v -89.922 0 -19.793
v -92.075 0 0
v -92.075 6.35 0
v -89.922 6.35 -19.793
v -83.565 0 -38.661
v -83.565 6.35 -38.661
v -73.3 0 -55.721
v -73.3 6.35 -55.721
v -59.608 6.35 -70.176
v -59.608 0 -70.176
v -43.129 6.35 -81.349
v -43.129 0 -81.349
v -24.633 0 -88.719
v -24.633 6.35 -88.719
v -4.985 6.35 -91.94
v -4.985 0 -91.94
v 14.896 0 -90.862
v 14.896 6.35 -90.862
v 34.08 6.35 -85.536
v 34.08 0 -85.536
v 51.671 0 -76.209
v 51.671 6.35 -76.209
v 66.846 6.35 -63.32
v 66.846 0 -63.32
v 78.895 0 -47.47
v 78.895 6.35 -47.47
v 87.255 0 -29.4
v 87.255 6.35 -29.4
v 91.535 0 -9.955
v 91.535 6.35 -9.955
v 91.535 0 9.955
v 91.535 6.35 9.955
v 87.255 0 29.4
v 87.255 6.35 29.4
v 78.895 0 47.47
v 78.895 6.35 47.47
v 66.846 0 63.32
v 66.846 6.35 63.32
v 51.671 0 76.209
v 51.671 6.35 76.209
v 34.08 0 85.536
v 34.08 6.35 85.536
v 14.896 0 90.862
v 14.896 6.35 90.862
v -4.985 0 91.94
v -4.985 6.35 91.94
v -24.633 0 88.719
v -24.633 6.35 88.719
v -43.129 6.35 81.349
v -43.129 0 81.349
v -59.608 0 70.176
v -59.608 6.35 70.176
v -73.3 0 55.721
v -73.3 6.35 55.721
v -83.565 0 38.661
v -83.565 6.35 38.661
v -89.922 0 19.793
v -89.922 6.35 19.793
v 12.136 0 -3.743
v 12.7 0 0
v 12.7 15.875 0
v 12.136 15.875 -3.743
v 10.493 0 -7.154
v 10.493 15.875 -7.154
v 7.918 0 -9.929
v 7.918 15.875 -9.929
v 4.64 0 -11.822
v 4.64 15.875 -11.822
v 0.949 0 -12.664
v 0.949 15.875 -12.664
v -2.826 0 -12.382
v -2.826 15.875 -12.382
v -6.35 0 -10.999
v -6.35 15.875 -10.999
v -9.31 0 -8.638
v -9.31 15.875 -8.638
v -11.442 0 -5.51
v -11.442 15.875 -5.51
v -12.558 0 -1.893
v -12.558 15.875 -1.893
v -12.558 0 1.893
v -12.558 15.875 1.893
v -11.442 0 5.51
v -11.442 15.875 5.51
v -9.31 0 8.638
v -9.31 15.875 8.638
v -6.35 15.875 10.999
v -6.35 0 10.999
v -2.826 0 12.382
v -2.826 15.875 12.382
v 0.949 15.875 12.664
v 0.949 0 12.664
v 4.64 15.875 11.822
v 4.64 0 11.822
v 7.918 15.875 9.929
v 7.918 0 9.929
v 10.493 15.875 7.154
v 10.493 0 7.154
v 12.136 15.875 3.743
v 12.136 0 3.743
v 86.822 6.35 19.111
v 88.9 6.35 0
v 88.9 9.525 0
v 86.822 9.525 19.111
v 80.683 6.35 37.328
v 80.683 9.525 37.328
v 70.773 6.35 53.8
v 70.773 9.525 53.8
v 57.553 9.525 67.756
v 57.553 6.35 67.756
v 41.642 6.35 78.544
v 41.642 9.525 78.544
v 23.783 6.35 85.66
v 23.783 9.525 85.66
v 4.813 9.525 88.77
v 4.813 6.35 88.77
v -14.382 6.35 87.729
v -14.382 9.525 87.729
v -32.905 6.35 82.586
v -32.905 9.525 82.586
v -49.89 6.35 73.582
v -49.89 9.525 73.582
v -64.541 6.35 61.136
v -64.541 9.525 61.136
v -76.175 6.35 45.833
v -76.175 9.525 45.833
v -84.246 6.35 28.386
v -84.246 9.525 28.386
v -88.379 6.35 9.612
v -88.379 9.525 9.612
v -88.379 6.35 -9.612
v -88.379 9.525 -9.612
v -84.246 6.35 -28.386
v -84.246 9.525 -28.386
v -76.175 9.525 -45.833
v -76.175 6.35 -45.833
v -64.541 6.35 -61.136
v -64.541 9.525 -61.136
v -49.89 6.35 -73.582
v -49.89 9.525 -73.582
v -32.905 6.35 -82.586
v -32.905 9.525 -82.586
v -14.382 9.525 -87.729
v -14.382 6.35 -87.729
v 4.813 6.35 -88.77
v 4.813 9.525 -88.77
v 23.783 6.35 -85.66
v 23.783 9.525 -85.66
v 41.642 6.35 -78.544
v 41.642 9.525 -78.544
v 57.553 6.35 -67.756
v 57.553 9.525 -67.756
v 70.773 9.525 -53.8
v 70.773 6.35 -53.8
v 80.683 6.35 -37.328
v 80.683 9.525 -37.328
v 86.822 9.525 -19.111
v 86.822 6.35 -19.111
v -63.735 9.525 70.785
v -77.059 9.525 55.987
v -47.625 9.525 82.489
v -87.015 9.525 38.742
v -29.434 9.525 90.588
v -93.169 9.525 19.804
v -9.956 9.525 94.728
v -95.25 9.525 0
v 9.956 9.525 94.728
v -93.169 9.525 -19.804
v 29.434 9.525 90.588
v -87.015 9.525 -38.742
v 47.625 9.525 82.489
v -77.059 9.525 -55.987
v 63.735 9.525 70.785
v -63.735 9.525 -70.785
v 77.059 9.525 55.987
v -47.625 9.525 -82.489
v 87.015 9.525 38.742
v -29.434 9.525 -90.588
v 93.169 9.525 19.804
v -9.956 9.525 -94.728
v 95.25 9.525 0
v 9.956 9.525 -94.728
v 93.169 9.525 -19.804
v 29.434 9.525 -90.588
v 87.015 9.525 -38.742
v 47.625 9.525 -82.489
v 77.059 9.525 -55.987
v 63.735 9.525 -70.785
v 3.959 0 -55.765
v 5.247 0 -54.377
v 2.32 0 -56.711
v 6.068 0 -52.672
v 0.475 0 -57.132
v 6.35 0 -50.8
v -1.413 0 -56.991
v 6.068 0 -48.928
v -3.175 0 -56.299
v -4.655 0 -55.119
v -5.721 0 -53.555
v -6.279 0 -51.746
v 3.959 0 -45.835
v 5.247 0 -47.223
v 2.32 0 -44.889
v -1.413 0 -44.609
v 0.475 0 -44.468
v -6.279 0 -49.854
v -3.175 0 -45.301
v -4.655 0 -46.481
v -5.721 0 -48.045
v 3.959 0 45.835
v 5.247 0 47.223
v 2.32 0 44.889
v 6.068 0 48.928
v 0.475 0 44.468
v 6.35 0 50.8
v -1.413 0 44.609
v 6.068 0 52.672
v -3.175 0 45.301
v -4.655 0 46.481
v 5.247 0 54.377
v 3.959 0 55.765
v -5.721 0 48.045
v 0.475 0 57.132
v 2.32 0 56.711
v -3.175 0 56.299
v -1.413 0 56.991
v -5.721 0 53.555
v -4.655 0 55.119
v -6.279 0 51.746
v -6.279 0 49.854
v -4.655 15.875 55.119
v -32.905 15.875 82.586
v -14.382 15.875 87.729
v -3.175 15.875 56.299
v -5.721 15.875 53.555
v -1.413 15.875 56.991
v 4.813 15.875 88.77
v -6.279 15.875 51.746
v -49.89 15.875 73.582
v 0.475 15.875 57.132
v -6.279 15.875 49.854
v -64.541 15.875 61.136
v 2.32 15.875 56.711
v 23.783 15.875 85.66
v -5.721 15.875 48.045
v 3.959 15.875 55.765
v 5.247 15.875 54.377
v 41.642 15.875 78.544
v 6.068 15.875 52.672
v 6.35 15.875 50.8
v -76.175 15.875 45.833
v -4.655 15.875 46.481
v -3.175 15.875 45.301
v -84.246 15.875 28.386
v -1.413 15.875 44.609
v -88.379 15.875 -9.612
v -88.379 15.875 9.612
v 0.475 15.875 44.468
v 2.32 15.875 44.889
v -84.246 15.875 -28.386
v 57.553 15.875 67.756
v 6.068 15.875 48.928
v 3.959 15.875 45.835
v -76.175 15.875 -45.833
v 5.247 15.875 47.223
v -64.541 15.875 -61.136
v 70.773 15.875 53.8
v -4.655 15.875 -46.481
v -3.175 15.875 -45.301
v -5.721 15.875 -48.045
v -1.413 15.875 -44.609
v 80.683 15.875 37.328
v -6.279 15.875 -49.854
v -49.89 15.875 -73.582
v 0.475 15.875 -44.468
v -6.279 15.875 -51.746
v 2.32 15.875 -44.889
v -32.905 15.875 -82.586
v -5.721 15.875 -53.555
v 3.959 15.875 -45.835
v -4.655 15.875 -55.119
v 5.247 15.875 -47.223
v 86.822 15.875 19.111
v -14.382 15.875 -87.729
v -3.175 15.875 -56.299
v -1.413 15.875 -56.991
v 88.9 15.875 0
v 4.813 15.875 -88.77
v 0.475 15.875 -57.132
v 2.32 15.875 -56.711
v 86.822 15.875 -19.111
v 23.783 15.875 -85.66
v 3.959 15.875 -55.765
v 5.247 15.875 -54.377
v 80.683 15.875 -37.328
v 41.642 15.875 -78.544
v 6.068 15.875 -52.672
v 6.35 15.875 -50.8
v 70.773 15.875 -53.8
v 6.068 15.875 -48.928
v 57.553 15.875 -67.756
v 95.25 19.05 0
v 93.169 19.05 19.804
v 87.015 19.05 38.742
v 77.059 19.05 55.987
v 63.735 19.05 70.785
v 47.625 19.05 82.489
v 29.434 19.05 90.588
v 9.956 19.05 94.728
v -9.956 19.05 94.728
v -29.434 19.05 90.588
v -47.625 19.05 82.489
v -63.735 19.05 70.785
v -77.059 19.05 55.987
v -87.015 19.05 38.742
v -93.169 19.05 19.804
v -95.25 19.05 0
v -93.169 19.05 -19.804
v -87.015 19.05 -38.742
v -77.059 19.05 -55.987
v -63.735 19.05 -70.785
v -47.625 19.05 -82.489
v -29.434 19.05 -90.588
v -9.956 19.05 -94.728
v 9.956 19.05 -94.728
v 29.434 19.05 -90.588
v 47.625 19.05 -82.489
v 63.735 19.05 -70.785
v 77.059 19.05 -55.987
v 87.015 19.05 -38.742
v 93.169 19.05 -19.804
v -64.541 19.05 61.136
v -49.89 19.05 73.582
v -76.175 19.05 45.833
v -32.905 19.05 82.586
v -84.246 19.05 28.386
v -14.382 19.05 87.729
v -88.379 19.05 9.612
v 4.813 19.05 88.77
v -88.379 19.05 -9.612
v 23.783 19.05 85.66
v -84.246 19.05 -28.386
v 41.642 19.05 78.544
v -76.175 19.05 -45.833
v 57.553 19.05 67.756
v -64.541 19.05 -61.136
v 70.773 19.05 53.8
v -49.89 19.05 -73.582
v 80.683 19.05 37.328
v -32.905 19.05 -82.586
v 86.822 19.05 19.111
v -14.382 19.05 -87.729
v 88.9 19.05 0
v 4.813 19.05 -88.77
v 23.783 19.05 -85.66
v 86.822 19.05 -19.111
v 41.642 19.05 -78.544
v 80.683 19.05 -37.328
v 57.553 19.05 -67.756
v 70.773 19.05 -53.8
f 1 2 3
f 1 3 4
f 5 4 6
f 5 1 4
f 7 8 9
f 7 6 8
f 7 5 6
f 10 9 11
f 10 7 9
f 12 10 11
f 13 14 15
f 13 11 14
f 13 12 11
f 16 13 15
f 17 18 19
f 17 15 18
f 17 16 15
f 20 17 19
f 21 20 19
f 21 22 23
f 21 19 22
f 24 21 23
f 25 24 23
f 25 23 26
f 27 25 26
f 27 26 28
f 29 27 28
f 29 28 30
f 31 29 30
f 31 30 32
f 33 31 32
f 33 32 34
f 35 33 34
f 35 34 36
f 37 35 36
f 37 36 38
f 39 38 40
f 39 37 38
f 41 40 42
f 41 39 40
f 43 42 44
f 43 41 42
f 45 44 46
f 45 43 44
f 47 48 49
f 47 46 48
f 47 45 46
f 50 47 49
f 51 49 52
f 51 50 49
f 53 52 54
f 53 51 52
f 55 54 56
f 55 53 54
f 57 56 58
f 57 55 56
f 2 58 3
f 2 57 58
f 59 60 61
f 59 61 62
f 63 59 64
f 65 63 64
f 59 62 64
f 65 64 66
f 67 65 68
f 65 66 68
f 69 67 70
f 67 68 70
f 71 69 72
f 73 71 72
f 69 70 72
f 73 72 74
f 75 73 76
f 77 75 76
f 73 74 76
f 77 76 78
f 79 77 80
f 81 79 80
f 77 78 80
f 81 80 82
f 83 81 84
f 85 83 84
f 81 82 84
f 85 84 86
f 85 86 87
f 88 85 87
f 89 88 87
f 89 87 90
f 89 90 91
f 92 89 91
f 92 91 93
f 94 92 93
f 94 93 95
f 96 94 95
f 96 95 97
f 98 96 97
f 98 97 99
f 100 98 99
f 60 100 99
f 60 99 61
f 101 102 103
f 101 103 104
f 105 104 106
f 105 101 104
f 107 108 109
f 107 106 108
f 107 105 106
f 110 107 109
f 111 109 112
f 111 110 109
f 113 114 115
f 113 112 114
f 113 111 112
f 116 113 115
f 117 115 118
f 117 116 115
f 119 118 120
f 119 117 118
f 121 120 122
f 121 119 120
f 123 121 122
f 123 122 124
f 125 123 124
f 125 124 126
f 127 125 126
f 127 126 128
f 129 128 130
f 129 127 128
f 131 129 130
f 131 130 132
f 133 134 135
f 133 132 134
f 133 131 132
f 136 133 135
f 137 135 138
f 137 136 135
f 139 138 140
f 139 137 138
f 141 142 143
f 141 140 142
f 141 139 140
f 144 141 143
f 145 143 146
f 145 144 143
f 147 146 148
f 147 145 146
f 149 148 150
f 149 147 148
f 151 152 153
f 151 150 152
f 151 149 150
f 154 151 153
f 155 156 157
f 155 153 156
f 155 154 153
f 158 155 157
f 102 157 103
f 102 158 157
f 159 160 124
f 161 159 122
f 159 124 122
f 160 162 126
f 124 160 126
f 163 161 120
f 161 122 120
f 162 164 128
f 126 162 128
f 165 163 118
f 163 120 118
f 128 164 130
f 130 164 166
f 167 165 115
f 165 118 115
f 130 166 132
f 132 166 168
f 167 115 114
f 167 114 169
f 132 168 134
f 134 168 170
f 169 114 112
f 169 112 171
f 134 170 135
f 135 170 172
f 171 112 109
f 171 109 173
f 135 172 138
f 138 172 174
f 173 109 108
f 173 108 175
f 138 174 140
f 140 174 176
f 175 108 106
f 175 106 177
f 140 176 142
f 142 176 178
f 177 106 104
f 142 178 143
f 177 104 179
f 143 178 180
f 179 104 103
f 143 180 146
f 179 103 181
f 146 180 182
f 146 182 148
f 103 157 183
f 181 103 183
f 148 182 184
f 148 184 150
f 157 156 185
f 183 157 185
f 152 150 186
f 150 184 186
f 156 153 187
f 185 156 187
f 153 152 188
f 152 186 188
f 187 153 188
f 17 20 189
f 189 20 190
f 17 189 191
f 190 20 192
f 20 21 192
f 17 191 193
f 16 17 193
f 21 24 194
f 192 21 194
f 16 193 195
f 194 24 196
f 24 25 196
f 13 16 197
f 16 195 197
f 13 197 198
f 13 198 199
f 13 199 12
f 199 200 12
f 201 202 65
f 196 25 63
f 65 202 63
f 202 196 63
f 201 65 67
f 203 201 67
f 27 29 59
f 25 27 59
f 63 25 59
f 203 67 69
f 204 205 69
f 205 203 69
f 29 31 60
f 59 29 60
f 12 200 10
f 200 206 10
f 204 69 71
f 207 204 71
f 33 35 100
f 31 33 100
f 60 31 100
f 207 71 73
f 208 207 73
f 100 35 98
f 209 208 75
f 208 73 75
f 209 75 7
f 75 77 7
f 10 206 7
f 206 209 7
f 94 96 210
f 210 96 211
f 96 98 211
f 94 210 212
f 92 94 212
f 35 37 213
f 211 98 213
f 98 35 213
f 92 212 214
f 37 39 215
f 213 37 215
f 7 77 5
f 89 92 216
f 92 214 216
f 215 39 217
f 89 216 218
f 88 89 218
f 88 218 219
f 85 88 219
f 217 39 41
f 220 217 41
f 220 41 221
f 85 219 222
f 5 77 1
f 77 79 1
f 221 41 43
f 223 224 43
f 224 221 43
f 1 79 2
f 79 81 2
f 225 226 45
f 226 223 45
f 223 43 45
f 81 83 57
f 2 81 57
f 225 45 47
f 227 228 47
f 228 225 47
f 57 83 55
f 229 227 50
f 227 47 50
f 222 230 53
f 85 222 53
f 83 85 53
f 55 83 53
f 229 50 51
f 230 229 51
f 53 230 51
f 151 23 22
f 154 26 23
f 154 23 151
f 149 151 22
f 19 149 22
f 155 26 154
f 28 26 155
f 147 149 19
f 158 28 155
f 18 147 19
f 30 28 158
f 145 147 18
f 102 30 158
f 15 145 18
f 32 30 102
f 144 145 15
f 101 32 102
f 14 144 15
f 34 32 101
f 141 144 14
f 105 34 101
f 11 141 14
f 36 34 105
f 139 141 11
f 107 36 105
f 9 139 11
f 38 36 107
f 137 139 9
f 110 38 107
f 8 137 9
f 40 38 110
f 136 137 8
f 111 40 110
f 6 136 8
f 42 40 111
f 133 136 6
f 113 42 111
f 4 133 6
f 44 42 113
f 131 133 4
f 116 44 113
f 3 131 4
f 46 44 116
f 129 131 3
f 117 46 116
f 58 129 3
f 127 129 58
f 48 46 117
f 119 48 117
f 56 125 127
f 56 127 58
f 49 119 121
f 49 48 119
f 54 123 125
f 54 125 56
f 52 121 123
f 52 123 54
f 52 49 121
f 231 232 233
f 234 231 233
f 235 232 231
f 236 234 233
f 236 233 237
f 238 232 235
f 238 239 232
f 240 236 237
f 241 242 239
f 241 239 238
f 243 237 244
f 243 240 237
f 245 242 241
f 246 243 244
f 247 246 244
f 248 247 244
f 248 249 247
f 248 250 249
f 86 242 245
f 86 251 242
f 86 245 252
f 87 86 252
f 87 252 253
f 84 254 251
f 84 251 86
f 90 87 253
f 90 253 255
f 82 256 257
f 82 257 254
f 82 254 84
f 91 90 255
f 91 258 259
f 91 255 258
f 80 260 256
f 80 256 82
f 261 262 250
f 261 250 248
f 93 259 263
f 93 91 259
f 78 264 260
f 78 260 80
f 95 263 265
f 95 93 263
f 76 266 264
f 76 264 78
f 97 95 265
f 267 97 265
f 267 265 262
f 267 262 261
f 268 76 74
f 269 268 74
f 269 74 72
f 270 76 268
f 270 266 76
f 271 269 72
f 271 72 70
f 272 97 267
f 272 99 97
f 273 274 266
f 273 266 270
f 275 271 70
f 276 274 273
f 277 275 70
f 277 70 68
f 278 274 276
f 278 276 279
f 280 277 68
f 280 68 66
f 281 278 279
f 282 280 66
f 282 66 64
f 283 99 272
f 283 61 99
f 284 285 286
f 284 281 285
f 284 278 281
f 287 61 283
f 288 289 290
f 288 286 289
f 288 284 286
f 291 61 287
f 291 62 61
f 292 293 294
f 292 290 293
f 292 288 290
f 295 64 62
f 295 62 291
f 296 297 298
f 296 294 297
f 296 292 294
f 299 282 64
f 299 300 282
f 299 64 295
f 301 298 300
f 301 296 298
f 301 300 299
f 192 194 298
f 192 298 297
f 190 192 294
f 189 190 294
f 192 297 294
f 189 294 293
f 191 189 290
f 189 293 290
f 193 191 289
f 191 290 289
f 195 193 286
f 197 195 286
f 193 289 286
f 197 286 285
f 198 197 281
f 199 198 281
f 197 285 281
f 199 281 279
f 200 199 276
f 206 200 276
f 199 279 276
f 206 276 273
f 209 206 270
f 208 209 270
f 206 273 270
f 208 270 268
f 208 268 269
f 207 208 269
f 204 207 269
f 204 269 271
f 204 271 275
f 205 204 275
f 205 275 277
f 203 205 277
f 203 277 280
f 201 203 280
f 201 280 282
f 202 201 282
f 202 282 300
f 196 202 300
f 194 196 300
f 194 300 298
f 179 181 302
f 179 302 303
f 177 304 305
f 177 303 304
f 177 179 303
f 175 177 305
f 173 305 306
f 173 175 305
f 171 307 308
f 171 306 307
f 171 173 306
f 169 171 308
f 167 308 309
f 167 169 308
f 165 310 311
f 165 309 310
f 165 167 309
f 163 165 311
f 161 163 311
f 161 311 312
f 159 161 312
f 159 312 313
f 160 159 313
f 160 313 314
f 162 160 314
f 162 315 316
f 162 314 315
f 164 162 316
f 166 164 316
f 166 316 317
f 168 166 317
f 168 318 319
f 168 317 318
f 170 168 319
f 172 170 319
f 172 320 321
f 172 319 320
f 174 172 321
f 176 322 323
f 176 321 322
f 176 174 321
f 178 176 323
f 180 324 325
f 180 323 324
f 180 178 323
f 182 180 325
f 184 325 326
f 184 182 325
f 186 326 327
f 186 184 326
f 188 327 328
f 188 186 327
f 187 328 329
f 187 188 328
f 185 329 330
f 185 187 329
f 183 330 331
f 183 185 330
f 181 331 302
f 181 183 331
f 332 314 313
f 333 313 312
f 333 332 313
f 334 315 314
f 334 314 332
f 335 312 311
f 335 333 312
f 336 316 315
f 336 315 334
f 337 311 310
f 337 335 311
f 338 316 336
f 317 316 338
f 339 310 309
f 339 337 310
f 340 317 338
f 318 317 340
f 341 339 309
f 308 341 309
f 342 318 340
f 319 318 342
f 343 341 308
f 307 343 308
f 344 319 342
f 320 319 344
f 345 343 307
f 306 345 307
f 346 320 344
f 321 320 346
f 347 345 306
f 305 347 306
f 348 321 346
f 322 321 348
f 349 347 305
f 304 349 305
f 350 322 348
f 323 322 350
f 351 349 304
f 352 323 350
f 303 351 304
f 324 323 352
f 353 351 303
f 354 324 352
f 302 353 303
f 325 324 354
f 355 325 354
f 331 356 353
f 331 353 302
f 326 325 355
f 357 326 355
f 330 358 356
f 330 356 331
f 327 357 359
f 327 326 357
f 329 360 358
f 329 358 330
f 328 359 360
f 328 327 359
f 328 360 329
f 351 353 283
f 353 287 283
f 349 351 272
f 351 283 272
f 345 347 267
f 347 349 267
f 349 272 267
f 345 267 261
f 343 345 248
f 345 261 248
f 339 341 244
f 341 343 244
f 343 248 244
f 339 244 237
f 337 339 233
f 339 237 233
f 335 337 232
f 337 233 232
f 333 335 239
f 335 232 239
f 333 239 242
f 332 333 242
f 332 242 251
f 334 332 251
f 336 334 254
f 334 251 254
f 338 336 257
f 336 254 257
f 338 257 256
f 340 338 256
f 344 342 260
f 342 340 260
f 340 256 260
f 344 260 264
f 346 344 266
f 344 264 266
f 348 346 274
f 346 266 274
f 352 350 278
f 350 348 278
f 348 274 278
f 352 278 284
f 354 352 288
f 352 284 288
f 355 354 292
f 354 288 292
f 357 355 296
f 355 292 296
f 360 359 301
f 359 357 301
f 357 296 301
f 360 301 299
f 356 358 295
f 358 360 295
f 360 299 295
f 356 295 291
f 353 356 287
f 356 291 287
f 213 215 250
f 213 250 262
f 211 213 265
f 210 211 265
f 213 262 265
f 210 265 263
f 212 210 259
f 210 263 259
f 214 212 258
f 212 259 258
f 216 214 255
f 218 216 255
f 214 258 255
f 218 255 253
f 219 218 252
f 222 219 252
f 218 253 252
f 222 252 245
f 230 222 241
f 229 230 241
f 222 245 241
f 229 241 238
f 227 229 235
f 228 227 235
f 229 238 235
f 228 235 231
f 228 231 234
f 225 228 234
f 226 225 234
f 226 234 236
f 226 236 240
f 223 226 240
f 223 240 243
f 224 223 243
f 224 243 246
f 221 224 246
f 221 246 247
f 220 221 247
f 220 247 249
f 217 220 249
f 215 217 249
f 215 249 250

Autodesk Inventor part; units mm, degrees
ref_plane "YZ Plane" through (0, 0, 0) normal (1, 0, 0) x (0, 1, 0)
ref_plane "XZ Plane" through (0, 0, 0) normal (0, 1, 0) x (-1, 0, 0)
ref_plane "XY Plane" through (0, 0, 0) normal (0, 0, 1) x (1, 0, 0)
sketch "Sketch1" plane through (0, 0, 0) normal (0, 1, 0) x (-1, 0, 0)
  circle A0 centre (0, 0) radius 92.075
  dimension "d0" = 184.15
extrude "Extrusion1" add sketch "Sketch1" along normal blind 6.35
sketch "Sketch2" plane through (0, 6.35, 0) normal (0, 1, 0) x (1, 0, 0)
  circle A0 centre (0, 0) radius 88.9
  dimension "d3" = 177.8
extrude "Extrusion2" add sketch "Sketch2" along normal blind 3.175
sketch "Sketch3" plane through (0, 9.525, 0) normal (0, 1, 0) x (1, 0, 0)
  circle A0 centre (0, 0) radius 95.25
  dimension "d6" = 190.5
extrude "Extrusion3" add sketch "Sketch3" along normal blind 6.35
sketch "Sketch8" plane through (0, 15.875, 0) normal (0, 1, 0) x (1, 0, 0)
  circle A0 centre (0, 0) radius 95.25
  circle A1 centre (0, 0) radius 88.9
  dimension "d33" = 177.8
  dimension "d34" = 190.5
extrude "Extrusion9" add sketch "Sketch8" along normal blind 3.175
sketch "Sketch9" plane through (0, 15.875, 0) normal (0, 1, 0) x (1, 0, 0)
  circle A0 centre (0, 0) radius 12.7
  circle A1 centre (0, -50.8) radius 6.35
  circle A2 centre (0, 50.8) radius 6.35
  dimension "d37" = 12.7
  dimension "d38" = 50.8
  dimension "d39" = 50.8
  dimension "d40" = 25.4
extrude "Extrusion10" cut sketch "Sketch9" against normal through all
properties part number "upper_thermal_barrier" material "Phenolic Resin"
